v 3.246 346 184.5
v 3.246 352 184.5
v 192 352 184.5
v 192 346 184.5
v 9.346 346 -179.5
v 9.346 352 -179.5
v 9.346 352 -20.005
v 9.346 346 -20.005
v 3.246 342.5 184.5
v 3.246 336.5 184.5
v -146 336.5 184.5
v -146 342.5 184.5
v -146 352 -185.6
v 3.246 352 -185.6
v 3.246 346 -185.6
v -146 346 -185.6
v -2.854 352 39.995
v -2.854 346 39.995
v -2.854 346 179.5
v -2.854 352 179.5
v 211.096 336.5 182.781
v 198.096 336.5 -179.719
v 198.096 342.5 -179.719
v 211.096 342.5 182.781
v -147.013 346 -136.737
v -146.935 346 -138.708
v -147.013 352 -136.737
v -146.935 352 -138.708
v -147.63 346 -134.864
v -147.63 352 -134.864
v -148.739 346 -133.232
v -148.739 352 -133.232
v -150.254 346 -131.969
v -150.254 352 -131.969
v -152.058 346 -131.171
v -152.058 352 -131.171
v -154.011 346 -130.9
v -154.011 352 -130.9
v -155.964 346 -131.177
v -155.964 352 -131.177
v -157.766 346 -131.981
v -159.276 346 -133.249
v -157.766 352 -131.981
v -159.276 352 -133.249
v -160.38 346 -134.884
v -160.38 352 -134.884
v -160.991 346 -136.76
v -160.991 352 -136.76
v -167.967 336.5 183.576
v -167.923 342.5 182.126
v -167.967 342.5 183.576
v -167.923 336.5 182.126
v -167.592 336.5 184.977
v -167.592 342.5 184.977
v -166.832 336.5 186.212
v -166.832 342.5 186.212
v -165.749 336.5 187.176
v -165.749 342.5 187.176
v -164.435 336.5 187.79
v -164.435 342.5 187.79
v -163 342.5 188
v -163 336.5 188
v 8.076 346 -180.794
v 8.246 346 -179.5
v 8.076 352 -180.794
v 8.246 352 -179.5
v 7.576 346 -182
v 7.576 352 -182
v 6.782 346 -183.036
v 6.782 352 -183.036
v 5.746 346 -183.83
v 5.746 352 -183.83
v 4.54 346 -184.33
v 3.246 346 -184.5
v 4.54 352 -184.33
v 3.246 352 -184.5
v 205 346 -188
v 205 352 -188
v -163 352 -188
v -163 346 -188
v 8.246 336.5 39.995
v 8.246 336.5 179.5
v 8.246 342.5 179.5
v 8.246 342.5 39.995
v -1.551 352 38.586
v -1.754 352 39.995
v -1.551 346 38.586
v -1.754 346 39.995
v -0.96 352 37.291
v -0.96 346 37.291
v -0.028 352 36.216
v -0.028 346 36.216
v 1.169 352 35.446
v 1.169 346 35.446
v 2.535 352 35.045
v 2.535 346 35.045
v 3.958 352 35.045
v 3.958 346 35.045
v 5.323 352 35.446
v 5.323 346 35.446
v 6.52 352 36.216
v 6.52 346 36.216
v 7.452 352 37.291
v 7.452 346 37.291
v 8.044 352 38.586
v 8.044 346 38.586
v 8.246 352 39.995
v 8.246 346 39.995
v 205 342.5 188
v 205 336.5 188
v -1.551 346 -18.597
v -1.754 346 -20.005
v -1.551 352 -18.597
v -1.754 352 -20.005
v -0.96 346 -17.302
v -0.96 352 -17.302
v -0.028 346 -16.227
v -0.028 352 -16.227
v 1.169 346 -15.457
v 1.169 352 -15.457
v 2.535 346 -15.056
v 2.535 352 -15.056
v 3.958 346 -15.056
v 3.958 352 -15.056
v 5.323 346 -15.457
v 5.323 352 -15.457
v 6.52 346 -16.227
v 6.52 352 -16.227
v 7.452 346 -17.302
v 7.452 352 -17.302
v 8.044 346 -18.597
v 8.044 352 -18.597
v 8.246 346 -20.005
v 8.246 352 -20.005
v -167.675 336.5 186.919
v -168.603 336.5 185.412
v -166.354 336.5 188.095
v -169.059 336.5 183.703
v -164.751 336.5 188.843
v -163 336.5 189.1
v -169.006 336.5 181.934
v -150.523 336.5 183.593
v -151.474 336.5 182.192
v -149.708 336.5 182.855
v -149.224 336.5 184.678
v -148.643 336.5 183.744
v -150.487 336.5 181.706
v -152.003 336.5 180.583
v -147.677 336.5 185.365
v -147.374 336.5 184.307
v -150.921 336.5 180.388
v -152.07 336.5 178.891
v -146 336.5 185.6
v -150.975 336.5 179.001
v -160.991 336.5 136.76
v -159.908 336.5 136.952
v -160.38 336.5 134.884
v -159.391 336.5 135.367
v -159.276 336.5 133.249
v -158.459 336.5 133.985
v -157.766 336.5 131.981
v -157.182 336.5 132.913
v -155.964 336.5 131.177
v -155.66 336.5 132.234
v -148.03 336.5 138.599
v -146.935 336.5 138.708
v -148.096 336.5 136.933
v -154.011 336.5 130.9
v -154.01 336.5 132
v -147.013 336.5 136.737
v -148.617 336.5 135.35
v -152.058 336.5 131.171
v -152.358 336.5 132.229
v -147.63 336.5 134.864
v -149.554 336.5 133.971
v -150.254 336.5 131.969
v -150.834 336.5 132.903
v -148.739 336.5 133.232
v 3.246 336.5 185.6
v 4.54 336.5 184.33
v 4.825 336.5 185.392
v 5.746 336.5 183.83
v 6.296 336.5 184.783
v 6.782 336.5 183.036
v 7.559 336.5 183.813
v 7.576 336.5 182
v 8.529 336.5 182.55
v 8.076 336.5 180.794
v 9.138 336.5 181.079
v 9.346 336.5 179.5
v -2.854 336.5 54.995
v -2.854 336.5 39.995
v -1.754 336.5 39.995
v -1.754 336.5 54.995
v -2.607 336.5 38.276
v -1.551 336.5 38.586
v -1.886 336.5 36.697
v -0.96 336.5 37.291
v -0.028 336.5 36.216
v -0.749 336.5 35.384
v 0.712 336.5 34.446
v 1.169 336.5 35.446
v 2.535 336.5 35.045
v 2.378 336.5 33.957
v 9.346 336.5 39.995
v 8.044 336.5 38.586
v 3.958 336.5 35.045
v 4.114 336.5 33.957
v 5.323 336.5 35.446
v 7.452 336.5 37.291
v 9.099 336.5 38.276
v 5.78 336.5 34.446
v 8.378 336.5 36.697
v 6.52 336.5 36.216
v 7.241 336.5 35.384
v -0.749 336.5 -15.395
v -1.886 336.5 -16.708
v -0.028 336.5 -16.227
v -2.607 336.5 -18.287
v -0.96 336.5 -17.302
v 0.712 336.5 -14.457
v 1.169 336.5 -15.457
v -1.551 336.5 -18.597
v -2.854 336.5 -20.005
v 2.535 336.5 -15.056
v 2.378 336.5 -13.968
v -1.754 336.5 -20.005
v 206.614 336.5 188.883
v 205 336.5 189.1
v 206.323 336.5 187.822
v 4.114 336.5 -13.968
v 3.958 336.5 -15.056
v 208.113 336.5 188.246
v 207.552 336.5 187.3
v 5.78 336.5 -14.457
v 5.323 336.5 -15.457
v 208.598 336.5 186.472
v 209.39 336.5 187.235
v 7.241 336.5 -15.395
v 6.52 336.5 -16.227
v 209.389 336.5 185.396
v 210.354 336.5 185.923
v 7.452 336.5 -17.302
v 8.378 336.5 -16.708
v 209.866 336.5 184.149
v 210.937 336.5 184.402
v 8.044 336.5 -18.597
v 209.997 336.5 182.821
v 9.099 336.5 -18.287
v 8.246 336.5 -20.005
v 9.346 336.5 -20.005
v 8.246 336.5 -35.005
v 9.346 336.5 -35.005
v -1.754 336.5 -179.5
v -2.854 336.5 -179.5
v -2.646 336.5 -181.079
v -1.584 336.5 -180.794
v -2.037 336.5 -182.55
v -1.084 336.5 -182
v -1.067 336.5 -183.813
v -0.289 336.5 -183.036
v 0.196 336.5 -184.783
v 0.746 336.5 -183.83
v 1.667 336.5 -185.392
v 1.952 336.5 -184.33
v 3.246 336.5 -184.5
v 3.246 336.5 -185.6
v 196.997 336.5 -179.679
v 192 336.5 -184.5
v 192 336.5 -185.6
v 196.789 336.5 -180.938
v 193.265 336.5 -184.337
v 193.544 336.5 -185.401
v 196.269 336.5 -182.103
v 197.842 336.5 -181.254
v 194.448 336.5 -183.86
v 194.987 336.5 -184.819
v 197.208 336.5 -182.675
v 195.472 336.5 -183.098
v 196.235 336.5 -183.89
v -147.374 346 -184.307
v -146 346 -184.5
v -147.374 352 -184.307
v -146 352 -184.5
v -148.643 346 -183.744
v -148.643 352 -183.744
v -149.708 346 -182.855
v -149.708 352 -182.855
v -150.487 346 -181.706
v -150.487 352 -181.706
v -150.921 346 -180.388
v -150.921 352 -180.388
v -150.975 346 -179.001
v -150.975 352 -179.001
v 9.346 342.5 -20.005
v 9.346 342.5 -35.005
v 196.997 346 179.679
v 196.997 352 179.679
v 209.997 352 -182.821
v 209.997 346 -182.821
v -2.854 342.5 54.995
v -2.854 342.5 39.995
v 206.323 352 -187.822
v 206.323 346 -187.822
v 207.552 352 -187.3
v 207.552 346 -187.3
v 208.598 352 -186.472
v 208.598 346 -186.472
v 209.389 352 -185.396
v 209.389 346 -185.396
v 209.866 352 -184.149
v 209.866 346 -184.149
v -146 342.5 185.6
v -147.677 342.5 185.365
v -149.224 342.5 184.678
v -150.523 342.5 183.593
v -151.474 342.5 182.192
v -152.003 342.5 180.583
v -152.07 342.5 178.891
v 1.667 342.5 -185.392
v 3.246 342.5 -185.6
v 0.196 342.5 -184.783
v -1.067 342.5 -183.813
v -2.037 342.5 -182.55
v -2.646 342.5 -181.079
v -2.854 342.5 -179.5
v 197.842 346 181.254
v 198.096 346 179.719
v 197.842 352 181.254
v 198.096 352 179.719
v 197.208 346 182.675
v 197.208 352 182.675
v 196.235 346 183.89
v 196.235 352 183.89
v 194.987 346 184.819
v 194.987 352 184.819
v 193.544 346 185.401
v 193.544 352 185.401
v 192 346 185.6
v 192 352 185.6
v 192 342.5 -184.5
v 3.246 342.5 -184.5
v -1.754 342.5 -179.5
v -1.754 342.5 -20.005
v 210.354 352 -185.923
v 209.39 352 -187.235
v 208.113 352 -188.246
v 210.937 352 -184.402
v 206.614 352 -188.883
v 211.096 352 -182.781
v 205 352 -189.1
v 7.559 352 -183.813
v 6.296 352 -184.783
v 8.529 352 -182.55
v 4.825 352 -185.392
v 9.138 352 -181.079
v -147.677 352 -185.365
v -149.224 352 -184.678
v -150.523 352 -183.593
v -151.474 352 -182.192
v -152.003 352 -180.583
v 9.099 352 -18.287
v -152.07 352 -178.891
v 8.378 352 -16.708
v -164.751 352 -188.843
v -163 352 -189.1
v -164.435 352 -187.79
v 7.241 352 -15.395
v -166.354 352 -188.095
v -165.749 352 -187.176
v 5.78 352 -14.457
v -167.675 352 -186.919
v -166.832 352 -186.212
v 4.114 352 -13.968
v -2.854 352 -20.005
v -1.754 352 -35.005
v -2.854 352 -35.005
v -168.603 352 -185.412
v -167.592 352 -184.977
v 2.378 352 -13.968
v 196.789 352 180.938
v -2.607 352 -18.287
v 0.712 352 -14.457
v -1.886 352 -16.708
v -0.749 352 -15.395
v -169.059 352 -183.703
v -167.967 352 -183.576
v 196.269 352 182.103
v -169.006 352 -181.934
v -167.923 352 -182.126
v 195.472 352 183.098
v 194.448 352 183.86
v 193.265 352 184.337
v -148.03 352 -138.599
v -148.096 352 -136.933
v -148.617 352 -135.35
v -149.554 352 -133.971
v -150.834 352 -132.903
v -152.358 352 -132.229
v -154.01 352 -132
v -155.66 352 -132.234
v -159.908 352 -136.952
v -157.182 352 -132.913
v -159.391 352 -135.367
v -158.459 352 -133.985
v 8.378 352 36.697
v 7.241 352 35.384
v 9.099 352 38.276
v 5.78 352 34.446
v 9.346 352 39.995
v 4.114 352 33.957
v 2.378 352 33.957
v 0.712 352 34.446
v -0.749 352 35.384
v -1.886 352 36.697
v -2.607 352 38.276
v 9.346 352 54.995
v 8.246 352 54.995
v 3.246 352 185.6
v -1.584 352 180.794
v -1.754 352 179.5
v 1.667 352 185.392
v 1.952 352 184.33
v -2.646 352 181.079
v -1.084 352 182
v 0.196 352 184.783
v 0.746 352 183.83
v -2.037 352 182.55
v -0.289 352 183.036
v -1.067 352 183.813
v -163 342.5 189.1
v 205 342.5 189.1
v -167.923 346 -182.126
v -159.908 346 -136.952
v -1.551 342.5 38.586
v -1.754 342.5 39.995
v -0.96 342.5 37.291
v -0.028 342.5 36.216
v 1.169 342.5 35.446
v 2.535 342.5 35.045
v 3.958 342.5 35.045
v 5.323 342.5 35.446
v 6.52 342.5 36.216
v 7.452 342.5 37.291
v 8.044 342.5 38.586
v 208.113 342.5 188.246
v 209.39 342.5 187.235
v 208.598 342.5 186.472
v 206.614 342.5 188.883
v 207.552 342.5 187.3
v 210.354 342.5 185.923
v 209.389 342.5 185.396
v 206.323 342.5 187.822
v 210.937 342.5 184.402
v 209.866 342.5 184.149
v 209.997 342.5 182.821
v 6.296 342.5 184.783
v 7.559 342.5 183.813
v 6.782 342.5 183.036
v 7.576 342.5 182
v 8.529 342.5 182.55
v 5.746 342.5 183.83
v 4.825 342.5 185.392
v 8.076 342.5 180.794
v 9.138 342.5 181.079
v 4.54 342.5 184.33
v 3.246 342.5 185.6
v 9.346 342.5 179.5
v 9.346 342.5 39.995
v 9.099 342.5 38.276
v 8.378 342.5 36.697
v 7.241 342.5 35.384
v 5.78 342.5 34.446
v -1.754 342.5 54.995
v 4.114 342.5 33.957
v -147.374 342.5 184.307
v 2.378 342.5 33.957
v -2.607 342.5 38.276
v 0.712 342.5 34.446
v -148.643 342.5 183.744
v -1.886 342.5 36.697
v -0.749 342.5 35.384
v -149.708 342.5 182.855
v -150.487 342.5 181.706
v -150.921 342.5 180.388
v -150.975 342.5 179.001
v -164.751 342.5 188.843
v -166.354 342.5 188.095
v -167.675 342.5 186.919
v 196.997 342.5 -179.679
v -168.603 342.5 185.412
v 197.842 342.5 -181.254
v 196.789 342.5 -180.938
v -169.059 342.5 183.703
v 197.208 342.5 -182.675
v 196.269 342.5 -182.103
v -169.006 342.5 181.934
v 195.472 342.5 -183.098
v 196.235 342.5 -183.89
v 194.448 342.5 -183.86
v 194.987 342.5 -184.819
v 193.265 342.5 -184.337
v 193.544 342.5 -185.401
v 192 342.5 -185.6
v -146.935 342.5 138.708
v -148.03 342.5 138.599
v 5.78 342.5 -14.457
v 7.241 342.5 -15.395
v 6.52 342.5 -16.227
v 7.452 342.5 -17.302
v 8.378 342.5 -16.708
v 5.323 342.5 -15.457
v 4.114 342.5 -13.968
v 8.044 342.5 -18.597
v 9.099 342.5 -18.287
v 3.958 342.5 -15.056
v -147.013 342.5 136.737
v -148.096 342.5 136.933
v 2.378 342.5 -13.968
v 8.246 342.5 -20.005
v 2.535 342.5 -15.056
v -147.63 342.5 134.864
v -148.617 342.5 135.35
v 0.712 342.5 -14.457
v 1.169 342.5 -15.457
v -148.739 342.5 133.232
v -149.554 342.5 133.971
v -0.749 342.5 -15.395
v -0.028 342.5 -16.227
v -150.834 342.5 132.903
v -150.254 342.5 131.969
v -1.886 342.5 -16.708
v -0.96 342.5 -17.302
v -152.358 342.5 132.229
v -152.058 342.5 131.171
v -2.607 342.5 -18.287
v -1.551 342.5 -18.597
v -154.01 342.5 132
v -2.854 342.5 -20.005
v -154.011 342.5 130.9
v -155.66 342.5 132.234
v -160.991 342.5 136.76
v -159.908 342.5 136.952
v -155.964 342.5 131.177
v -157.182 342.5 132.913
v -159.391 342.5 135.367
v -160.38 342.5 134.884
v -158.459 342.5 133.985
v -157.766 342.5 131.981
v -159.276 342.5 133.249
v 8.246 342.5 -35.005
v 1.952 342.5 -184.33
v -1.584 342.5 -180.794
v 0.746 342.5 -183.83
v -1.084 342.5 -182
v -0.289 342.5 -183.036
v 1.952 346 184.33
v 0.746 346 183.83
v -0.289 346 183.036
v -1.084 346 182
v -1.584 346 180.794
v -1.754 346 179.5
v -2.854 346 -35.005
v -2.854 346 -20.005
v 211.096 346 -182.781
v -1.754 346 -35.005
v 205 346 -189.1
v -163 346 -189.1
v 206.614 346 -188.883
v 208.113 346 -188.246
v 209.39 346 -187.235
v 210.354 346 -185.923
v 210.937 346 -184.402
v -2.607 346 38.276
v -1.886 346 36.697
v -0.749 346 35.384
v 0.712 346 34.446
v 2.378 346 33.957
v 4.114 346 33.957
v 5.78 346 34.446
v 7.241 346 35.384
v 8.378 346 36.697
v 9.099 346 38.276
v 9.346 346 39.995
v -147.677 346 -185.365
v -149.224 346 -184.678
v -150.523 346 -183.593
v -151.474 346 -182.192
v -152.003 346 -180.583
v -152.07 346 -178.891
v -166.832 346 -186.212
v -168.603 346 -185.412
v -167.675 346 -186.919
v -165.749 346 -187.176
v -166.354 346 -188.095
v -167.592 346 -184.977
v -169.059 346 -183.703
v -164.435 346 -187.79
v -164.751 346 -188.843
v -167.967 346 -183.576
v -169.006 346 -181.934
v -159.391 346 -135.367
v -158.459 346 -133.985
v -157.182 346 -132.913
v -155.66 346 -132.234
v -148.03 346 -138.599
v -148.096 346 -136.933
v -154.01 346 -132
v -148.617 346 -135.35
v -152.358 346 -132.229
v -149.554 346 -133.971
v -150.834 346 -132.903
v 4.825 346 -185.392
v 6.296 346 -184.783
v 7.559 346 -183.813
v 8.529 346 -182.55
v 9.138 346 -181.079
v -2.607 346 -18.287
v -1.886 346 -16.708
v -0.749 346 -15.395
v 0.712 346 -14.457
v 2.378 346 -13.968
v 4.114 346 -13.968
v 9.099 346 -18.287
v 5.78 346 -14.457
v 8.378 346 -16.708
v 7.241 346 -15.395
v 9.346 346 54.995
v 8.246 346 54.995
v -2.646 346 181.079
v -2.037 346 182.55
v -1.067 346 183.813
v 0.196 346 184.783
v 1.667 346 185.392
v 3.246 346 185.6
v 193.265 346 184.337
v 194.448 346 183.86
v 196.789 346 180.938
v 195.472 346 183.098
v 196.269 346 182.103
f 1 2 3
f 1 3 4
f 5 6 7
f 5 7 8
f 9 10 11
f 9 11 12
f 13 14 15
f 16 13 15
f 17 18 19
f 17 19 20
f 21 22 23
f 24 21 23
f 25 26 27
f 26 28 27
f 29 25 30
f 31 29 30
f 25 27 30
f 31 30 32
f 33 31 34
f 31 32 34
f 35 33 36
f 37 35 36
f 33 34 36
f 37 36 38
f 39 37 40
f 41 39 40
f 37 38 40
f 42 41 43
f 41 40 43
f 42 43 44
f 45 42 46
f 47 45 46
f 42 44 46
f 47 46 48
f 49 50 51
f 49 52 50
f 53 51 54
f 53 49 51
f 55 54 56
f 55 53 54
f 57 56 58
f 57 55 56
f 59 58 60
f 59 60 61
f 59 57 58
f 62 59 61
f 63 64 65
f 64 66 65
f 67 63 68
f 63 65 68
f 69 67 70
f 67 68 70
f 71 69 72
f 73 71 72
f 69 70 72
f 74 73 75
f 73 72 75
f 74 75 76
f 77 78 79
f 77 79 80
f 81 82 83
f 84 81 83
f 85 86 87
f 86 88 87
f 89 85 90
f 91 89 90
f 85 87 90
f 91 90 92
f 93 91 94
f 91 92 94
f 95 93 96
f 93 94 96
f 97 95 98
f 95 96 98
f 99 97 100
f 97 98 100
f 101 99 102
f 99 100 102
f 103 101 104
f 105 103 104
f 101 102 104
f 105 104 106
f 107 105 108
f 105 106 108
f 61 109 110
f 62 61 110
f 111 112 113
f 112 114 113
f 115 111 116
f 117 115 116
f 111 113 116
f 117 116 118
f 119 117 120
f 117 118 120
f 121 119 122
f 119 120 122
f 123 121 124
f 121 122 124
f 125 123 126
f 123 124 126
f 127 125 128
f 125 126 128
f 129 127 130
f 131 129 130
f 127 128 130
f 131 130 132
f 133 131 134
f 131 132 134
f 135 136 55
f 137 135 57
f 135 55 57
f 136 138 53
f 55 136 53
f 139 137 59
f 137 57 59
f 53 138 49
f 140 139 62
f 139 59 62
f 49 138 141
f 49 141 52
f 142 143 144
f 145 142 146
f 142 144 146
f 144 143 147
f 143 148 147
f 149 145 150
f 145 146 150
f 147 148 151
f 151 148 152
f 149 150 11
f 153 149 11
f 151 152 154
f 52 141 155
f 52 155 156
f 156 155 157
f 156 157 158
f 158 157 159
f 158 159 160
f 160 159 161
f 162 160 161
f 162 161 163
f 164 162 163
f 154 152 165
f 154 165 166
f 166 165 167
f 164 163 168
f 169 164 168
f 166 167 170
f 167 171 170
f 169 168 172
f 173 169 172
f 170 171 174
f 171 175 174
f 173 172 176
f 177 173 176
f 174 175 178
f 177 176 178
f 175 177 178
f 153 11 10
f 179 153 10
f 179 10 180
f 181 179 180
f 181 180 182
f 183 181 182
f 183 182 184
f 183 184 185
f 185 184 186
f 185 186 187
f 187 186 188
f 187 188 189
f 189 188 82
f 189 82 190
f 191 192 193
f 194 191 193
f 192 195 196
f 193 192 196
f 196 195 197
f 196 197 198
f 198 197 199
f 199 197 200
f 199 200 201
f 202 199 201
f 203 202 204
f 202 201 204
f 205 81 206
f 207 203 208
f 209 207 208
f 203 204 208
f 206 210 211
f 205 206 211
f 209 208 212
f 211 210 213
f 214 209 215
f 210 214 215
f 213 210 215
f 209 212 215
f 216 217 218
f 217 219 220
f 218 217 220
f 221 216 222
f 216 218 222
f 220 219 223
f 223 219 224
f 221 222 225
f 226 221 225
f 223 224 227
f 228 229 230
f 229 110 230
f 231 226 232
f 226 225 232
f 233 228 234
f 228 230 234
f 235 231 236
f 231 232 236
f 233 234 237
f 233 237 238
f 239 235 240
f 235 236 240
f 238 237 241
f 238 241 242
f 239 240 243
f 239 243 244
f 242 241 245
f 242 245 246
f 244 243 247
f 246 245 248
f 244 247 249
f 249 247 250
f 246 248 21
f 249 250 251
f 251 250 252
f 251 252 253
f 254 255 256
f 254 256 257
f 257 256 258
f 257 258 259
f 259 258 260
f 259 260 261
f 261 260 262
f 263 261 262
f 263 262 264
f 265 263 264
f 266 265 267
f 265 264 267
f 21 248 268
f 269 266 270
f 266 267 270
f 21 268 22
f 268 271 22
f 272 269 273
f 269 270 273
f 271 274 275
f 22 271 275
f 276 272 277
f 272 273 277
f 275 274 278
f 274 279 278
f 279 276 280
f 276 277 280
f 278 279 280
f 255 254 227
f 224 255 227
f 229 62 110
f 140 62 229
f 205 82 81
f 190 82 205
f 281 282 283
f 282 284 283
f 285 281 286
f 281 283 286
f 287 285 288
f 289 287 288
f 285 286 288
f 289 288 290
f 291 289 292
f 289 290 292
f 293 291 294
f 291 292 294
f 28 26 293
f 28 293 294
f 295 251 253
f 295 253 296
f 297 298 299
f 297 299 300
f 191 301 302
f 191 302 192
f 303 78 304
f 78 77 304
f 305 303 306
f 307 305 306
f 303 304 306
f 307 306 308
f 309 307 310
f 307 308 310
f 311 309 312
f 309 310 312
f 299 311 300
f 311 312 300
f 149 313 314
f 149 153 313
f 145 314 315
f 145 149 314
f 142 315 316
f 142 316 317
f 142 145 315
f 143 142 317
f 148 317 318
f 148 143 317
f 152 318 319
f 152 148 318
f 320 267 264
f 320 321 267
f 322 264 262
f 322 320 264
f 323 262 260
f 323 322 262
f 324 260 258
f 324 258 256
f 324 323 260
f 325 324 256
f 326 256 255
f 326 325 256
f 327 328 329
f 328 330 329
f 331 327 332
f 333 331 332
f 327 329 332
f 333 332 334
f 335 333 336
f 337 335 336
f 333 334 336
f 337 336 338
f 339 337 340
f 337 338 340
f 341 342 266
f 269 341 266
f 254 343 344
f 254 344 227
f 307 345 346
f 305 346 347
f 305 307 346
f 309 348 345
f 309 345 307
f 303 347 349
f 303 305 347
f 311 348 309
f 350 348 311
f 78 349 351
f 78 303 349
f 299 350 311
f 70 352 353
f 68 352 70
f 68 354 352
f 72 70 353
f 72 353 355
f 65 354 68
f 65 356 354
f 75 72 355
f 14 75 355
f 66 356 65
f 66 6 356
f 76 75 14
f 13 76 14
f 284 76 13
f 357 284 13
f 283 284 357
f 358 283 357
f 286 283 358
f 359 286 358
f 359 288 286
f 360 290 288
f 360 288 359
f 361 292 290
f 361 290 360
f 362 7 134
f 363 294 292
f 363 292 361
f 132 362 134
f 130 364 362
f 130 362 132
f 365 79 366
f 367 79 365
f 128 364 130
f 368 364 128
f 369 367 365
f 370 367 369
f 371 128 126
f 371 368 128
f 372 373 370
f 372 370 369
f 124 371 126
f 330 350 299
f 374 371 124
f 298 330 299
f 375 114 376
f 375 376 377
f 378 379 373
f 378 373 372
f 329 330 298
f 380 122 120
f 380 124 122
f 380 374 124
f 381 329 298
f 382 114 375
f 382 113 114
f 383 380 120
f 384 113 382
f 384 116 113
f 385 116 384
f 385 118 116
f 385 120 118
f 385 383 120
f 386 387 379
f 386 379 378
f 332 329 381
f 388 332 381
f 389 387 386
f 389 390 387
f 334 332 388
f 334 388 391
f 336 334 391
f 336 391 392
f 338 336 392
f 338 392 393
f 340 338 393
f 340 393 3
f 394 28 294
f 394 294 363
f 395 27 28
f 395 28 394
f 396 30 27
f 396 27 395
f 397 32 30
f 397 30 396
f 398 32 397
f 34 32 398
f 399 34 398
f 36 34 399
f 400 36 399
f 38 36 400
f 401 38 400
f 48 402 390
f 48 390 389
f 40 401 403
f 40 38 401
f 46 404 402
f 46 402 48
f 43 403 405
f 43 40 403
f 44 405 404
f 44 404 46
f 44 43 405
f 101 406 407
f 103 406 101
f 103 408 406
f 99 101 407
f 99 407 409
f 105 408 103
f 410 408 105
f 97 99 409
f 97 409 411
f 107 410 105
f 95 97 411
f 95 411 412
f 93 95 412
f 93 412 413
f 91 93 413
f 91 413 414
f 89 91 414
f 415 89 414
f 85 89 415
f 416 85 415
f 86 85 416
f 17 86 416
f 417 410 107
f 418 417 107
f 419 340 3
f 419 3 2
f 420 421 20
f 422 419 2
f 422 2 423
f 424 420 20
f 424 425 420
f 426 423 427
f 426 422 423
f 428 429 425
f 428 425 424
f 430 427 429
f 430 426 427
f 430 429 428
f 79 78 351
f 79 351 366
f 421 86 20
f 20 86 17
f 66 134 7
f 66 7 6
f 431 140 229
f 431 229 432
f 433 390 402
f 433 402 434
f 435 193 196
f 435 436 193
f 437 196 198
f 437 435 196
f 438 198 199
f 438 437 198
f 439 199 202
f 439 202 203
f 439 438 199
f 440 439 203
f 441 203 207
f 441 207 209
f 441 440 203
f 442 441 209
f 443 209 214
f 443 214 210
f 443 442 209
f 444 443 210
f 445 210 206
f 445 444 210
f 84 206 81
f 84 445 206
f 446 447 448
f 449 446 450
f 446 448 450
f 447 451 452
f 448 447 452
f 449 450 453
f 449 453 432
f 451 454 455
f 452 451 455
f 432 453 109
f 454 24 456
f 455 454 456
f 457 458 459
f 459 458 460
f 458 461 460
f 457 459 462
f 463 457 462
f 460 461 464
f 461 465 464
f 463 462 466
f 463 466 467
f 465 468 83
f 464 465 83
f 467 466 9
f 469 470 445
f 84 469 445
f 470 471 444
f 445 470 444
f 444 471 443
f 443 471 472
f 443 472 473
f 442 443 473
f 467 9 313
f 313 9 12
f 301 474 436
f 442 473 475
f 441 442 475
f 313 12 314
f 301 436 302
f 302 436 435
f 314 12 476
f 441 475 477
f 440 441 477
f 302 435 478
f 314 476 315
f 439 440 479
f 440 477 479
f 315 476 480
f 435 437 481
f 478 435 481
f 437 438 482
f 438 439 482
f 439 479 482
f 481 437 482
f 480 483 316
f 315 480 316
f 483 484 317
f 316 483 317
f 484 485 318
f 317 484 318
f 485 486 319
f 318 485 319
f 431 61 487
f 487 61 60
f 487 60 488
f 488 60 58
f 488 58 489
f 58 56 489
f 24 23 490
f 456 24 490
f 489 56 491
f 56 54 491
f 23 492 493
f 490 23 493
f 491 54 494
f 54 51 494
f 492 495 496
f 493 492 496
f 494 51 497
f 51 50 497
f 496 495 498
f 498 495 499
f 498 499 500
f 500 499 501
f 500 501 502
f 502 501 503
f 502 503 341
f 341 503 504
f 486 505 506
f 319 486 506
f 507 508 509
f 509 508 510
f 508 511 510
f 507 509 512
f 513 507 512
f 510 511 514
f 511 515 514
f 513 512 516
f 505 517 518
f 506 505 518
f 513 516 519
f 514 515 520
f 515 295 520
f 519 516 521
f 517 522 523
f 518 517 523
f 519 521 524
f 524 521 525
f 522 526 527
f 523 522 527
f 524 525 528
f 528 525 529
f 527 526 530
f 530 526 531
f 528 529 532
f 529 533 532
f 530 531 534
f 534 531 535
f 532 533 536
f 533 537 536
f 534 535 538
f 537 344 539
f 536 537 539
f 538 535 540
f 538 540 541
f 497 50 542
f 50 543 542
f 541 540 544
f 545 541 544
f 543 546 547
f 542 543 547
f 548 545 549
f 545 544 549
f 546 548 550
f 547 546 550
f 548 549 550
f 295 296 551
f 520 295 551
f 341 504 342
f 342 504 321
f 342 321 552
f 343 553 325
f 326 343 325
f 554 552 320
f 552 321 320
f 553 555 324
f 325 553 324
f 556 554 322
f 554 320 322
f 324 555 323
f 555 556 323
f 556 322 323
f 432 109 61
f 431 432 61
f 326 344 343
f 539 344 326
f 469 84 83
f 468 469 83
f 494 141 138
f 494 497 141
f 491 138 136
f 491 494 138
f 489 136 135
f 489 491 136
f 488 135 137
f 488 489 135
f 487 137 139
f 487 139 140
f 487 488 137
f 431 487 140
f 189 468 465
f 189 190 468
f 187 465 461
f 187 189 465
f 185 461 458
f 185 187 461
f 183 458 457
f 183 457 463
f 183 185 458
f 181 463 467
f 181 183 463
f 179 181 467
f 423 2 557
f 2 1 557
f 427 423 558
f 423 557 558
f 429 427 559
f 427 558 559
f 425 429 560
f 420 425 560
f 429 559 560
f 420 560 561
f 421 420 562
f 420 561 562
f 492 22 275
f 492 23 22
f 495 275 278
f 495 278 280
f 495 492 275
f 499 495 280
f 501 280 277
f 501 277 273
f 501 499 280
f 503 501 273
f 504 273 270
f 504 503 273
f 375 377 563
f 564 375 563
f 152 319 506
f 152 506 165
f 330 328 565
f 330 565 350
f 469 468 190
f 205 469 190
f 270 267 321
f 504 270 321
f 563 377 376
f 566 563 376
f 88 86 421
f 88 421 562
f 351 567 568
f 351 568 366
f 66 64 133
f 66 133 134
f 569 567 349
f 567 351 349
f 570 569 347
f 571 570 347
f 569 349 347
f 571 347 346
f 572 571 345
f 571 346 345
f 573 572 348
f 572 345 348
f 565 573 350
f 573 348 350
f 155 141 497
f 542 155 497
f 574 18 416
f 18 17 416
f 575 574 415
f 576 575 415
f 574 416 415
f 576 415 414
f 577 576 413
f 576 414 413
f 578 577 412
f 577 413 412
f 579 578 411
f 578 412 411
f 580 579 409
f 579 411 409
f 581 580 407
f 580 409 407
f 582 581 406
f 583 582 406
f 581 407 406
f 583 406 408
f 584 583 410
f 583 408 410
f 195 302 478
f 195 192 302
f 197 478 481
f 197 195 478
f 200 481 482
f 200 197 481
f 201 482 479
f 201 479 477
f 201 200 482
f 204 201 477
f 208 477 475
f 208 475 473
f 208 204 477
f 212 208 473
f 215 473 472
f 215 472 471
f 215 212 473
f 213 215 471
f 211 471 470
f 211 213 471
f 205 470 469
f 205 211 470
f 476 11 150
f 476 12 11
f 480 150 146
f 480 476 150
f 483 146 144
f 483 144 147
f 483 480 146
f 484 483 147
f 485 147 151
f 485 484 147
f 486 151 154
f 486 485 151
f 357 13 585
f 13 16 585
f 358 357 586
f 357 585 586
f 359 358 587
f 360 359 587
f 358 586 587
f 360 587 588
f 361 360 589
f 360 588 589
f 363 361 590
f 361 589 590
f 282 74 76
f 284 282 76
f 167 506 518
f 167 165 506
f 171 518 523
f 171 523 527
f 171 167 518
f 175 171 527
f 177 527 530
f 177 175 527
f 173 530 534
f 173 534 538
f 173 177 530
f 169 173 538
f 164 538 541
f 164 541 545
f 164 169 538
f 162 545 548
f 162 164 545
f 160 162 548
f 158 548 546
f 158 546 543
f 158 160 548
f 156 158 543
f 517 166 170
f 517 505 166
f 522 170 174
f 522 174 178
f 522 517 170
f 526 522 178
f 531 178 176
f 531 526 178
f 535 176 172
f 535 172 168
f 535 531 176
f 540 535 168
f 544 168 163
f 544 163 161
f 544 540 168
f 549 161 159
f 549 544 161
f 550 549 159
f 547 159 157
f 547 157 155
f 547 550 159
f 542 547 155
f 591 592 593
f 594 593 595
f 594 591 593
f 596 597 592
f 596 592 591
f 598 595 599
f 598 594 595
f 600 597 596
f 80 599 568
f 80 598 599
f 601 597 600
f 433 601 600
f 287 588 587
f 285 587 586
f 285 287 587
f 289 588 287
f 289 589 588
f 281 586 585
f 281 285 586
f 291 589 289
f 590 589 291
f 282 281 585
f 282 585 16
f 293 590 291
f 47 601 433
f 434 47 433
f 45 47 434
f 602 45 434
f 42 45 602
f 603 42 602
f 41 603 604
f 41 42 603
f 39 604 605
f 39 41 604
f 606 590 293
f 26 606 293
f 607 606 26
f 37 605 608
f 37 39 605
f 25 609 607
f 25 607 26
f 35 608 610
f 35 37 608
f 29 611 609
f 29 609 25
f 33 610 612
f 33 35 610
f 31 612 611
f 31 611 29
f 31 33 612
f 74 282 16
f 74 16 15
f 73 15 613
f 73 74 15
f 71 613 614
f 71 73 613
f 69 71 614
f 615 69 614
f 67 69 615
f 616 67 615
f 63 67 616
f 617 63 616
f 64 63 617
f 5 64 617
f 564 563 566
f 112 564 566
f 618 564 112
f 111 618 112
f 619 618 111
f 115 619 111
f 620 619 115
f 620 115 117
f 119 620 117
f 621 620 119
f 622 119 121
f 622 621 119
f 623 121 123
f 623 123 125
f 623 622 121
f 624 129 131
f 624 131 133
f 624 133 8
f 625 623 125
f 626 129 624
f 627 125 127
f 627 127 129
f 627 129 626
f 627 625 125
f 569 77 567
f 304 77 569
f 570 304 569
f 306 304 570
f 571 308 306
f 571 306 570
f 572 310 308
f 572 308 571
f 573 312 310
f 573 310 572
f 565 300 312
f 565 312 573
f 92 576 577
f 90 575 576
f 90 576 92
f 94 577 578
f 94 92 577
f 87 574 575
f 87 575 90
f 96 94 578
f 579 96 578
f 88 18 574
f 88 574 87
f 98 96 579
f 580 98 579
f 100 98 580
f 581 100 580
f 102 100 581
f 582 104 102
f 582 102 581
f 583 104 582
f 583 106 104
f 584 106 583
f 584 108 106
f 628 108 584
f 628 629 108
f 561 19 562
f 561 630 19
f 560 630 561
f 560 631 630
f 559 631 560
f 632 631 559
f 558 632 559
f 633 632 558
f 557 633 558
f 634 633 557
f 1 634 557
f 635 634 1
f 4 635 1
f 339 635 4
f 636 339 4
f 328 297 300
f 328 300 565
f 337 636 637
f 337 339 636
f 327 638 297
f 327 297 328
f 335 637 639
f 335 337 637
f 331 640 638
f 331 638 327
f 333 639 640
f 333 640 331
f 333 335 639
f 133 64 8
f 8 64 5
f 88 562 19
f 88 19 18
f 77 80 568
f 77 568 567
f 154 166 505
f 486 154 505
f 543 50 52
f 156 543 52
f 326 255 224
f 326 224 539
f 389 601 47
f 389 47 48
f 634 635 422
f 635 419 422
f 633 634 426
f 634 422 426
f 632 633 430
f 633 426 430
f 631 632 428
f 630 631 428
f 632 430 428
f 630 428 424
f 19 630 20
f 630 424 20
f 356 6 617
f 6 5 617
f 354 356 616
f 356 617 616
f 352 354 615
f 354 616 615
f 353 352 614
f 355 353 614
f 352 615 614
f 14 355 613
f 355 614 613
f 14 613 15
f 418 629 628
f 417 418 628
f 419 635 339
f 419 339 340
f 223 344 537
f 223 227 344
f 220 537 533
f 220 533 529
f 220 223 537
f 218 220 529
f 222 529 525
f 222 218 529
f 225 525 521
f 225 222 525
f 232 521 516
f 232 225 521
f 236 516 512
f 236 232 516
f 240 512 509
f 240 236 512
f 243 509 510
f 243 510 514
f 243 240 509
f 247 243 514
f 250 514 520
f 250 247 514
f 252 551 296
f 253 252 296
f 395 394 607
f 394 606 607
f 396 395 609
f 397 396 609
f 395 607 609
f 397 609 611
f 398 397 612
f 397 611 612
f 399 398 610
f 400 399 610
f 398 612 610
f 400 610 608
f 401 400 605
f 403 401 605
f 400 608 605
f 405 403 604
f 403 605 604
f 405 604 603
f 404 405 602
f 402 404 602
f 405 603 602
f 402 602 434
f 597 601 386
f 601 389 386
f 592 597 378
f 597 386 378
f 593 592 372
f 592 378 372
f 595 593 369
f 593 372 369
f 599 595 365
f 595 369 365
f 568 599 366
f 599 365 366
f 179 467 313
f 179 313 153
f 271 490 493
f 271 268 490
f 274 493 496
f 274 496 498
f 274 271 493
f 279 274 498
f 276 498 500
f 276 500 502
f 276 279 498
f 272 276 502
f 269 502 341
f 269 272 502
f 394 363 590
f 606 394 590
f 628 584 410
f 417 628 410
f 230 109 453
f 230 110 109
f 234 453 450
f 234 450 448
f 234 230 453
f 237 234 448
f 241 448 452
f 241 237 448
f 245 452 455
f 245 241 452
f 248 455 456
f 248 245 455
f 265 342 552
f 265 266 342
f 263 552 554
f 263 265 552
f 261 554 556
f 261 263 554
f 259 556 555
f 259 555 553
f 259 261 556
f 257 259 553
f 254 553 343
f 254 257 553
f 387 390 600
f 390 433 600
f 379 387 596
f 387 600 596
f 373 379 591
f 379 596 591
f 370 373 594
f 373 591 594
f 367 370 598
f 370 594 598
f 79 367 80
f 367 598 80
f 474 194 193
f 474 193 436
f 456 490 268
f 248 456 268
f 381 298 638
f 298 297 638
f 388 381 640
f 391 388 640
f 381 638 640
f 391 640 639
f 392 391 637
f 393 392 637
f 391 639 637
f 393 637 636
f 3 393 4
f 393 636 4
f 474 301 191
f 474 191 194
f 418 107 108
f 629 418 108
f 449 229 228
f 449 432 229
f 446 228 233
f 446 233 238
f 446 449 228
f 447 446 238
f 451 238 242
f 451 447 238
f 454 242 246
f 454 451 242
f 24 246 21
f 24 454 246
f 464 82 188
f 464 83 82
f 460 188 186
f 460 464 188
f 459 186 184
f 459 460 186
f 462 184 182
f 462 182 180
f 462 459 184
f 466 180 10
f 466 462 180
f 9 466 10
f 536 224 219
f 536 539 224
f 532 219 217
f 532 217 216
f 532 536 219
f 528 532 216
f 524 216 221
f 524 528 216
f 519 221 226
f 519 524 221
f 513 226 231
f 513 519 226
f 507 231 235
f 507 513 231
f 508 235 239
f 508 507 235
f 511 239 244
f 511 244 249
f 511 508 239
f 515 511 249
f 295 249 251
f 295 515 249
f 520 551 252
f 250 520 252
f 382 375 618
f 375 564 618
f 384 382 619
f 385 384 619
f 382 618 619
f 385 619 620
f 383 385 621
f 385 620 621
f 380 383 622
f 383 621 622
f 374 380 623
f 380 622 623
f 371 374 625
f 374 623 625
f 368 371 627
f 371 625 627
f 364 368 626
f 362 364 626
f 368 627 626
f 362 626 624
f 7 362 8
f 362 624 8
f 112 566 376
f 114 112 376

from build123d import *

# Parameters (mm, degrees)
CROQUIS3_W = 1.1
CROQUIS3_H = 6
CROQUIS5_W = 1.1
CROQUIS5_H = 6


with BuildPart() as part:
    # Barrer1: sweep along a path in Croquis2
    with BuildLine(Plane(origin=(0, 336.5, 0), x_dir=(1, 0, 0), z_dir=(0, 1, 0))) as barrer1_path:
        Line((-2.853911117, -54.994524715), (-2.853911117, -39.994524715))
        ThreePointArc((-2.853911117, -39.994524715), (3.246088883, -33.894524715), (9.346088883, -39.994524715))
        Line((9.346088883, -39.994524715), (9.346088883, -179.5))
        ThreePointArc((9.346088883, -179.5), (7.559440248, -183.813351365), (3.246088883, -185.6))
        Line((3.246088883, -185.6), (-146, -185.6))
        ThreePointArc((-146, -185.6), (-150.523380854, -183.592557348), (-152.069572313, -178.891483819))
        Line((-152.069572313, -178.891483819), (-148.029928873, -138.598540506))
        ThreePointArc((-148.029928873, -138.598540506), (-153.176033769, -132.056845985), (-159.907728075, -136.951787718))
        Line((-159.907728075, -136.951787718), (-167.923106729, -182.126489765))
        ThreePointArc((-167.923106729, -182.126489765), (-166.831941491, -186.211887983), (-163, -188))
        Line((-163, -188), (205, -188))
        ThreePointArc((205, -188), (208.598331263, -186.471600801), (209.996787878, -182.820804849))
        Line((209.996787878, -182.820804849), (196.996787878, 179.679195151))
        ThreePointArc((196.996787878, 179.679195151), (195.471600801, 183.098331263), (192, 184.5))
        Line((192, 184.5), (3.246088883, 184.5))
        ThreePointArc((3.246088883, 184.5), (-0.289445023, 183.035533906), (-1.753911117, 179.5))
        Line((-1.753911117, 179.5), (-1.753911117, 20.005475285))
        ThreePointArc((-1.753911117, 20.005475285), (3.246088883, 15.005475285), (8.246088883, 20.005475285))
        Line((8.246088883, 20.005475285), (8.246088883, 35.005475285))
    # Croquis3 → Barrer1 (sweep)
    with BuildSketch(Plane.XY.offset(54.994524715)):
        with Locations((-2.303911117, 339.5)):
            Rectangle(CROQUIS3_W, CROQUIS3_H)
    sweep(path=barrer1_path.line)


with BuildPart() as body_2:
    # Barrer2: sweep along a path in Croquis4
    with BuildLine(Plane(origin=(0, 346, 0), x_dir=(1, 0, 0), z_dir=(0, 1, 0))) as barrer2_path:
        Line((-2.853911117, 35.005475285), (-2.853911117, 20.005475285))
        ThreePointArc((-2.853911117, 20.005475285), (3.246088883, 13.905475285), (9.346088883, 20.005475285))
        Line((9.346088883, 20.005475285), (9.346088883, 179.5))
        ThreePointArc((9.346088883, 179.5), (7.559440248, 183.813351365), (3.246088883, 185.6))
        Line((3.246088883, 185.6), (-146, 185.6))
        ThreePointArc((-146, 185.6), (-150.523380854, 183.592557348), (-152.069572313, 178.891483819))
        Line((-152.069572313, 178.891483819), (-148.029928873, 138.598540506))
        ThreePointArc((-148.029928873, 138.598540506), (-153.176033769, 132.056845985), (-159.907728075, 136.951787718))
        Line((-159.907728075, 136.951787718), (-167.923106655, 182.126489344))
        ThreePointArc((-167.923106655, 182.126489344), (-166.831941337, 186.211887854), (-162.999999572, 188))
        Line((-162.999999572, 188), (205, 188))
        ThreePointArc((205, 188), (208.598331263, 186.471600801), (209.996787878, 182.820804849))
        Line((209.996787878, 182.820804849), (196.996787878, -179.679195151))
        ThreePointArc((196.996787878, -179.679195151), (195.471600801, -183.098331263), (192, -184.5))
        Line((192, -184.5), (3.246088883, -184.5))
        ThreePointArc((3.246088883, -184.5), (-0.289445023, -183.035533906), (-1.753911117, -179.5))
        Line((-1.753911117, -179.5), (-1.753911117, -39.994524715))
        ThreePointArc((-1.753911117, -39.994524715), (3.246088883, -34.994524715), (8.246088883, -39.994524715))
        Line((8.246088883, -39.994524715), (8.246088883, -54.994524715))
    # Croquis5 → Barrer2 (sweep)
    with BuildSketch(Plane.XY.offset(-35.005475285)):
        with Locations((-2.303911117, 349)):
            Rectangle(CROQUIS5_W, CROQUIS5_H)
    sweep(path=barrer2_path.line)


solid = Compound([part.part, body_2.part])
